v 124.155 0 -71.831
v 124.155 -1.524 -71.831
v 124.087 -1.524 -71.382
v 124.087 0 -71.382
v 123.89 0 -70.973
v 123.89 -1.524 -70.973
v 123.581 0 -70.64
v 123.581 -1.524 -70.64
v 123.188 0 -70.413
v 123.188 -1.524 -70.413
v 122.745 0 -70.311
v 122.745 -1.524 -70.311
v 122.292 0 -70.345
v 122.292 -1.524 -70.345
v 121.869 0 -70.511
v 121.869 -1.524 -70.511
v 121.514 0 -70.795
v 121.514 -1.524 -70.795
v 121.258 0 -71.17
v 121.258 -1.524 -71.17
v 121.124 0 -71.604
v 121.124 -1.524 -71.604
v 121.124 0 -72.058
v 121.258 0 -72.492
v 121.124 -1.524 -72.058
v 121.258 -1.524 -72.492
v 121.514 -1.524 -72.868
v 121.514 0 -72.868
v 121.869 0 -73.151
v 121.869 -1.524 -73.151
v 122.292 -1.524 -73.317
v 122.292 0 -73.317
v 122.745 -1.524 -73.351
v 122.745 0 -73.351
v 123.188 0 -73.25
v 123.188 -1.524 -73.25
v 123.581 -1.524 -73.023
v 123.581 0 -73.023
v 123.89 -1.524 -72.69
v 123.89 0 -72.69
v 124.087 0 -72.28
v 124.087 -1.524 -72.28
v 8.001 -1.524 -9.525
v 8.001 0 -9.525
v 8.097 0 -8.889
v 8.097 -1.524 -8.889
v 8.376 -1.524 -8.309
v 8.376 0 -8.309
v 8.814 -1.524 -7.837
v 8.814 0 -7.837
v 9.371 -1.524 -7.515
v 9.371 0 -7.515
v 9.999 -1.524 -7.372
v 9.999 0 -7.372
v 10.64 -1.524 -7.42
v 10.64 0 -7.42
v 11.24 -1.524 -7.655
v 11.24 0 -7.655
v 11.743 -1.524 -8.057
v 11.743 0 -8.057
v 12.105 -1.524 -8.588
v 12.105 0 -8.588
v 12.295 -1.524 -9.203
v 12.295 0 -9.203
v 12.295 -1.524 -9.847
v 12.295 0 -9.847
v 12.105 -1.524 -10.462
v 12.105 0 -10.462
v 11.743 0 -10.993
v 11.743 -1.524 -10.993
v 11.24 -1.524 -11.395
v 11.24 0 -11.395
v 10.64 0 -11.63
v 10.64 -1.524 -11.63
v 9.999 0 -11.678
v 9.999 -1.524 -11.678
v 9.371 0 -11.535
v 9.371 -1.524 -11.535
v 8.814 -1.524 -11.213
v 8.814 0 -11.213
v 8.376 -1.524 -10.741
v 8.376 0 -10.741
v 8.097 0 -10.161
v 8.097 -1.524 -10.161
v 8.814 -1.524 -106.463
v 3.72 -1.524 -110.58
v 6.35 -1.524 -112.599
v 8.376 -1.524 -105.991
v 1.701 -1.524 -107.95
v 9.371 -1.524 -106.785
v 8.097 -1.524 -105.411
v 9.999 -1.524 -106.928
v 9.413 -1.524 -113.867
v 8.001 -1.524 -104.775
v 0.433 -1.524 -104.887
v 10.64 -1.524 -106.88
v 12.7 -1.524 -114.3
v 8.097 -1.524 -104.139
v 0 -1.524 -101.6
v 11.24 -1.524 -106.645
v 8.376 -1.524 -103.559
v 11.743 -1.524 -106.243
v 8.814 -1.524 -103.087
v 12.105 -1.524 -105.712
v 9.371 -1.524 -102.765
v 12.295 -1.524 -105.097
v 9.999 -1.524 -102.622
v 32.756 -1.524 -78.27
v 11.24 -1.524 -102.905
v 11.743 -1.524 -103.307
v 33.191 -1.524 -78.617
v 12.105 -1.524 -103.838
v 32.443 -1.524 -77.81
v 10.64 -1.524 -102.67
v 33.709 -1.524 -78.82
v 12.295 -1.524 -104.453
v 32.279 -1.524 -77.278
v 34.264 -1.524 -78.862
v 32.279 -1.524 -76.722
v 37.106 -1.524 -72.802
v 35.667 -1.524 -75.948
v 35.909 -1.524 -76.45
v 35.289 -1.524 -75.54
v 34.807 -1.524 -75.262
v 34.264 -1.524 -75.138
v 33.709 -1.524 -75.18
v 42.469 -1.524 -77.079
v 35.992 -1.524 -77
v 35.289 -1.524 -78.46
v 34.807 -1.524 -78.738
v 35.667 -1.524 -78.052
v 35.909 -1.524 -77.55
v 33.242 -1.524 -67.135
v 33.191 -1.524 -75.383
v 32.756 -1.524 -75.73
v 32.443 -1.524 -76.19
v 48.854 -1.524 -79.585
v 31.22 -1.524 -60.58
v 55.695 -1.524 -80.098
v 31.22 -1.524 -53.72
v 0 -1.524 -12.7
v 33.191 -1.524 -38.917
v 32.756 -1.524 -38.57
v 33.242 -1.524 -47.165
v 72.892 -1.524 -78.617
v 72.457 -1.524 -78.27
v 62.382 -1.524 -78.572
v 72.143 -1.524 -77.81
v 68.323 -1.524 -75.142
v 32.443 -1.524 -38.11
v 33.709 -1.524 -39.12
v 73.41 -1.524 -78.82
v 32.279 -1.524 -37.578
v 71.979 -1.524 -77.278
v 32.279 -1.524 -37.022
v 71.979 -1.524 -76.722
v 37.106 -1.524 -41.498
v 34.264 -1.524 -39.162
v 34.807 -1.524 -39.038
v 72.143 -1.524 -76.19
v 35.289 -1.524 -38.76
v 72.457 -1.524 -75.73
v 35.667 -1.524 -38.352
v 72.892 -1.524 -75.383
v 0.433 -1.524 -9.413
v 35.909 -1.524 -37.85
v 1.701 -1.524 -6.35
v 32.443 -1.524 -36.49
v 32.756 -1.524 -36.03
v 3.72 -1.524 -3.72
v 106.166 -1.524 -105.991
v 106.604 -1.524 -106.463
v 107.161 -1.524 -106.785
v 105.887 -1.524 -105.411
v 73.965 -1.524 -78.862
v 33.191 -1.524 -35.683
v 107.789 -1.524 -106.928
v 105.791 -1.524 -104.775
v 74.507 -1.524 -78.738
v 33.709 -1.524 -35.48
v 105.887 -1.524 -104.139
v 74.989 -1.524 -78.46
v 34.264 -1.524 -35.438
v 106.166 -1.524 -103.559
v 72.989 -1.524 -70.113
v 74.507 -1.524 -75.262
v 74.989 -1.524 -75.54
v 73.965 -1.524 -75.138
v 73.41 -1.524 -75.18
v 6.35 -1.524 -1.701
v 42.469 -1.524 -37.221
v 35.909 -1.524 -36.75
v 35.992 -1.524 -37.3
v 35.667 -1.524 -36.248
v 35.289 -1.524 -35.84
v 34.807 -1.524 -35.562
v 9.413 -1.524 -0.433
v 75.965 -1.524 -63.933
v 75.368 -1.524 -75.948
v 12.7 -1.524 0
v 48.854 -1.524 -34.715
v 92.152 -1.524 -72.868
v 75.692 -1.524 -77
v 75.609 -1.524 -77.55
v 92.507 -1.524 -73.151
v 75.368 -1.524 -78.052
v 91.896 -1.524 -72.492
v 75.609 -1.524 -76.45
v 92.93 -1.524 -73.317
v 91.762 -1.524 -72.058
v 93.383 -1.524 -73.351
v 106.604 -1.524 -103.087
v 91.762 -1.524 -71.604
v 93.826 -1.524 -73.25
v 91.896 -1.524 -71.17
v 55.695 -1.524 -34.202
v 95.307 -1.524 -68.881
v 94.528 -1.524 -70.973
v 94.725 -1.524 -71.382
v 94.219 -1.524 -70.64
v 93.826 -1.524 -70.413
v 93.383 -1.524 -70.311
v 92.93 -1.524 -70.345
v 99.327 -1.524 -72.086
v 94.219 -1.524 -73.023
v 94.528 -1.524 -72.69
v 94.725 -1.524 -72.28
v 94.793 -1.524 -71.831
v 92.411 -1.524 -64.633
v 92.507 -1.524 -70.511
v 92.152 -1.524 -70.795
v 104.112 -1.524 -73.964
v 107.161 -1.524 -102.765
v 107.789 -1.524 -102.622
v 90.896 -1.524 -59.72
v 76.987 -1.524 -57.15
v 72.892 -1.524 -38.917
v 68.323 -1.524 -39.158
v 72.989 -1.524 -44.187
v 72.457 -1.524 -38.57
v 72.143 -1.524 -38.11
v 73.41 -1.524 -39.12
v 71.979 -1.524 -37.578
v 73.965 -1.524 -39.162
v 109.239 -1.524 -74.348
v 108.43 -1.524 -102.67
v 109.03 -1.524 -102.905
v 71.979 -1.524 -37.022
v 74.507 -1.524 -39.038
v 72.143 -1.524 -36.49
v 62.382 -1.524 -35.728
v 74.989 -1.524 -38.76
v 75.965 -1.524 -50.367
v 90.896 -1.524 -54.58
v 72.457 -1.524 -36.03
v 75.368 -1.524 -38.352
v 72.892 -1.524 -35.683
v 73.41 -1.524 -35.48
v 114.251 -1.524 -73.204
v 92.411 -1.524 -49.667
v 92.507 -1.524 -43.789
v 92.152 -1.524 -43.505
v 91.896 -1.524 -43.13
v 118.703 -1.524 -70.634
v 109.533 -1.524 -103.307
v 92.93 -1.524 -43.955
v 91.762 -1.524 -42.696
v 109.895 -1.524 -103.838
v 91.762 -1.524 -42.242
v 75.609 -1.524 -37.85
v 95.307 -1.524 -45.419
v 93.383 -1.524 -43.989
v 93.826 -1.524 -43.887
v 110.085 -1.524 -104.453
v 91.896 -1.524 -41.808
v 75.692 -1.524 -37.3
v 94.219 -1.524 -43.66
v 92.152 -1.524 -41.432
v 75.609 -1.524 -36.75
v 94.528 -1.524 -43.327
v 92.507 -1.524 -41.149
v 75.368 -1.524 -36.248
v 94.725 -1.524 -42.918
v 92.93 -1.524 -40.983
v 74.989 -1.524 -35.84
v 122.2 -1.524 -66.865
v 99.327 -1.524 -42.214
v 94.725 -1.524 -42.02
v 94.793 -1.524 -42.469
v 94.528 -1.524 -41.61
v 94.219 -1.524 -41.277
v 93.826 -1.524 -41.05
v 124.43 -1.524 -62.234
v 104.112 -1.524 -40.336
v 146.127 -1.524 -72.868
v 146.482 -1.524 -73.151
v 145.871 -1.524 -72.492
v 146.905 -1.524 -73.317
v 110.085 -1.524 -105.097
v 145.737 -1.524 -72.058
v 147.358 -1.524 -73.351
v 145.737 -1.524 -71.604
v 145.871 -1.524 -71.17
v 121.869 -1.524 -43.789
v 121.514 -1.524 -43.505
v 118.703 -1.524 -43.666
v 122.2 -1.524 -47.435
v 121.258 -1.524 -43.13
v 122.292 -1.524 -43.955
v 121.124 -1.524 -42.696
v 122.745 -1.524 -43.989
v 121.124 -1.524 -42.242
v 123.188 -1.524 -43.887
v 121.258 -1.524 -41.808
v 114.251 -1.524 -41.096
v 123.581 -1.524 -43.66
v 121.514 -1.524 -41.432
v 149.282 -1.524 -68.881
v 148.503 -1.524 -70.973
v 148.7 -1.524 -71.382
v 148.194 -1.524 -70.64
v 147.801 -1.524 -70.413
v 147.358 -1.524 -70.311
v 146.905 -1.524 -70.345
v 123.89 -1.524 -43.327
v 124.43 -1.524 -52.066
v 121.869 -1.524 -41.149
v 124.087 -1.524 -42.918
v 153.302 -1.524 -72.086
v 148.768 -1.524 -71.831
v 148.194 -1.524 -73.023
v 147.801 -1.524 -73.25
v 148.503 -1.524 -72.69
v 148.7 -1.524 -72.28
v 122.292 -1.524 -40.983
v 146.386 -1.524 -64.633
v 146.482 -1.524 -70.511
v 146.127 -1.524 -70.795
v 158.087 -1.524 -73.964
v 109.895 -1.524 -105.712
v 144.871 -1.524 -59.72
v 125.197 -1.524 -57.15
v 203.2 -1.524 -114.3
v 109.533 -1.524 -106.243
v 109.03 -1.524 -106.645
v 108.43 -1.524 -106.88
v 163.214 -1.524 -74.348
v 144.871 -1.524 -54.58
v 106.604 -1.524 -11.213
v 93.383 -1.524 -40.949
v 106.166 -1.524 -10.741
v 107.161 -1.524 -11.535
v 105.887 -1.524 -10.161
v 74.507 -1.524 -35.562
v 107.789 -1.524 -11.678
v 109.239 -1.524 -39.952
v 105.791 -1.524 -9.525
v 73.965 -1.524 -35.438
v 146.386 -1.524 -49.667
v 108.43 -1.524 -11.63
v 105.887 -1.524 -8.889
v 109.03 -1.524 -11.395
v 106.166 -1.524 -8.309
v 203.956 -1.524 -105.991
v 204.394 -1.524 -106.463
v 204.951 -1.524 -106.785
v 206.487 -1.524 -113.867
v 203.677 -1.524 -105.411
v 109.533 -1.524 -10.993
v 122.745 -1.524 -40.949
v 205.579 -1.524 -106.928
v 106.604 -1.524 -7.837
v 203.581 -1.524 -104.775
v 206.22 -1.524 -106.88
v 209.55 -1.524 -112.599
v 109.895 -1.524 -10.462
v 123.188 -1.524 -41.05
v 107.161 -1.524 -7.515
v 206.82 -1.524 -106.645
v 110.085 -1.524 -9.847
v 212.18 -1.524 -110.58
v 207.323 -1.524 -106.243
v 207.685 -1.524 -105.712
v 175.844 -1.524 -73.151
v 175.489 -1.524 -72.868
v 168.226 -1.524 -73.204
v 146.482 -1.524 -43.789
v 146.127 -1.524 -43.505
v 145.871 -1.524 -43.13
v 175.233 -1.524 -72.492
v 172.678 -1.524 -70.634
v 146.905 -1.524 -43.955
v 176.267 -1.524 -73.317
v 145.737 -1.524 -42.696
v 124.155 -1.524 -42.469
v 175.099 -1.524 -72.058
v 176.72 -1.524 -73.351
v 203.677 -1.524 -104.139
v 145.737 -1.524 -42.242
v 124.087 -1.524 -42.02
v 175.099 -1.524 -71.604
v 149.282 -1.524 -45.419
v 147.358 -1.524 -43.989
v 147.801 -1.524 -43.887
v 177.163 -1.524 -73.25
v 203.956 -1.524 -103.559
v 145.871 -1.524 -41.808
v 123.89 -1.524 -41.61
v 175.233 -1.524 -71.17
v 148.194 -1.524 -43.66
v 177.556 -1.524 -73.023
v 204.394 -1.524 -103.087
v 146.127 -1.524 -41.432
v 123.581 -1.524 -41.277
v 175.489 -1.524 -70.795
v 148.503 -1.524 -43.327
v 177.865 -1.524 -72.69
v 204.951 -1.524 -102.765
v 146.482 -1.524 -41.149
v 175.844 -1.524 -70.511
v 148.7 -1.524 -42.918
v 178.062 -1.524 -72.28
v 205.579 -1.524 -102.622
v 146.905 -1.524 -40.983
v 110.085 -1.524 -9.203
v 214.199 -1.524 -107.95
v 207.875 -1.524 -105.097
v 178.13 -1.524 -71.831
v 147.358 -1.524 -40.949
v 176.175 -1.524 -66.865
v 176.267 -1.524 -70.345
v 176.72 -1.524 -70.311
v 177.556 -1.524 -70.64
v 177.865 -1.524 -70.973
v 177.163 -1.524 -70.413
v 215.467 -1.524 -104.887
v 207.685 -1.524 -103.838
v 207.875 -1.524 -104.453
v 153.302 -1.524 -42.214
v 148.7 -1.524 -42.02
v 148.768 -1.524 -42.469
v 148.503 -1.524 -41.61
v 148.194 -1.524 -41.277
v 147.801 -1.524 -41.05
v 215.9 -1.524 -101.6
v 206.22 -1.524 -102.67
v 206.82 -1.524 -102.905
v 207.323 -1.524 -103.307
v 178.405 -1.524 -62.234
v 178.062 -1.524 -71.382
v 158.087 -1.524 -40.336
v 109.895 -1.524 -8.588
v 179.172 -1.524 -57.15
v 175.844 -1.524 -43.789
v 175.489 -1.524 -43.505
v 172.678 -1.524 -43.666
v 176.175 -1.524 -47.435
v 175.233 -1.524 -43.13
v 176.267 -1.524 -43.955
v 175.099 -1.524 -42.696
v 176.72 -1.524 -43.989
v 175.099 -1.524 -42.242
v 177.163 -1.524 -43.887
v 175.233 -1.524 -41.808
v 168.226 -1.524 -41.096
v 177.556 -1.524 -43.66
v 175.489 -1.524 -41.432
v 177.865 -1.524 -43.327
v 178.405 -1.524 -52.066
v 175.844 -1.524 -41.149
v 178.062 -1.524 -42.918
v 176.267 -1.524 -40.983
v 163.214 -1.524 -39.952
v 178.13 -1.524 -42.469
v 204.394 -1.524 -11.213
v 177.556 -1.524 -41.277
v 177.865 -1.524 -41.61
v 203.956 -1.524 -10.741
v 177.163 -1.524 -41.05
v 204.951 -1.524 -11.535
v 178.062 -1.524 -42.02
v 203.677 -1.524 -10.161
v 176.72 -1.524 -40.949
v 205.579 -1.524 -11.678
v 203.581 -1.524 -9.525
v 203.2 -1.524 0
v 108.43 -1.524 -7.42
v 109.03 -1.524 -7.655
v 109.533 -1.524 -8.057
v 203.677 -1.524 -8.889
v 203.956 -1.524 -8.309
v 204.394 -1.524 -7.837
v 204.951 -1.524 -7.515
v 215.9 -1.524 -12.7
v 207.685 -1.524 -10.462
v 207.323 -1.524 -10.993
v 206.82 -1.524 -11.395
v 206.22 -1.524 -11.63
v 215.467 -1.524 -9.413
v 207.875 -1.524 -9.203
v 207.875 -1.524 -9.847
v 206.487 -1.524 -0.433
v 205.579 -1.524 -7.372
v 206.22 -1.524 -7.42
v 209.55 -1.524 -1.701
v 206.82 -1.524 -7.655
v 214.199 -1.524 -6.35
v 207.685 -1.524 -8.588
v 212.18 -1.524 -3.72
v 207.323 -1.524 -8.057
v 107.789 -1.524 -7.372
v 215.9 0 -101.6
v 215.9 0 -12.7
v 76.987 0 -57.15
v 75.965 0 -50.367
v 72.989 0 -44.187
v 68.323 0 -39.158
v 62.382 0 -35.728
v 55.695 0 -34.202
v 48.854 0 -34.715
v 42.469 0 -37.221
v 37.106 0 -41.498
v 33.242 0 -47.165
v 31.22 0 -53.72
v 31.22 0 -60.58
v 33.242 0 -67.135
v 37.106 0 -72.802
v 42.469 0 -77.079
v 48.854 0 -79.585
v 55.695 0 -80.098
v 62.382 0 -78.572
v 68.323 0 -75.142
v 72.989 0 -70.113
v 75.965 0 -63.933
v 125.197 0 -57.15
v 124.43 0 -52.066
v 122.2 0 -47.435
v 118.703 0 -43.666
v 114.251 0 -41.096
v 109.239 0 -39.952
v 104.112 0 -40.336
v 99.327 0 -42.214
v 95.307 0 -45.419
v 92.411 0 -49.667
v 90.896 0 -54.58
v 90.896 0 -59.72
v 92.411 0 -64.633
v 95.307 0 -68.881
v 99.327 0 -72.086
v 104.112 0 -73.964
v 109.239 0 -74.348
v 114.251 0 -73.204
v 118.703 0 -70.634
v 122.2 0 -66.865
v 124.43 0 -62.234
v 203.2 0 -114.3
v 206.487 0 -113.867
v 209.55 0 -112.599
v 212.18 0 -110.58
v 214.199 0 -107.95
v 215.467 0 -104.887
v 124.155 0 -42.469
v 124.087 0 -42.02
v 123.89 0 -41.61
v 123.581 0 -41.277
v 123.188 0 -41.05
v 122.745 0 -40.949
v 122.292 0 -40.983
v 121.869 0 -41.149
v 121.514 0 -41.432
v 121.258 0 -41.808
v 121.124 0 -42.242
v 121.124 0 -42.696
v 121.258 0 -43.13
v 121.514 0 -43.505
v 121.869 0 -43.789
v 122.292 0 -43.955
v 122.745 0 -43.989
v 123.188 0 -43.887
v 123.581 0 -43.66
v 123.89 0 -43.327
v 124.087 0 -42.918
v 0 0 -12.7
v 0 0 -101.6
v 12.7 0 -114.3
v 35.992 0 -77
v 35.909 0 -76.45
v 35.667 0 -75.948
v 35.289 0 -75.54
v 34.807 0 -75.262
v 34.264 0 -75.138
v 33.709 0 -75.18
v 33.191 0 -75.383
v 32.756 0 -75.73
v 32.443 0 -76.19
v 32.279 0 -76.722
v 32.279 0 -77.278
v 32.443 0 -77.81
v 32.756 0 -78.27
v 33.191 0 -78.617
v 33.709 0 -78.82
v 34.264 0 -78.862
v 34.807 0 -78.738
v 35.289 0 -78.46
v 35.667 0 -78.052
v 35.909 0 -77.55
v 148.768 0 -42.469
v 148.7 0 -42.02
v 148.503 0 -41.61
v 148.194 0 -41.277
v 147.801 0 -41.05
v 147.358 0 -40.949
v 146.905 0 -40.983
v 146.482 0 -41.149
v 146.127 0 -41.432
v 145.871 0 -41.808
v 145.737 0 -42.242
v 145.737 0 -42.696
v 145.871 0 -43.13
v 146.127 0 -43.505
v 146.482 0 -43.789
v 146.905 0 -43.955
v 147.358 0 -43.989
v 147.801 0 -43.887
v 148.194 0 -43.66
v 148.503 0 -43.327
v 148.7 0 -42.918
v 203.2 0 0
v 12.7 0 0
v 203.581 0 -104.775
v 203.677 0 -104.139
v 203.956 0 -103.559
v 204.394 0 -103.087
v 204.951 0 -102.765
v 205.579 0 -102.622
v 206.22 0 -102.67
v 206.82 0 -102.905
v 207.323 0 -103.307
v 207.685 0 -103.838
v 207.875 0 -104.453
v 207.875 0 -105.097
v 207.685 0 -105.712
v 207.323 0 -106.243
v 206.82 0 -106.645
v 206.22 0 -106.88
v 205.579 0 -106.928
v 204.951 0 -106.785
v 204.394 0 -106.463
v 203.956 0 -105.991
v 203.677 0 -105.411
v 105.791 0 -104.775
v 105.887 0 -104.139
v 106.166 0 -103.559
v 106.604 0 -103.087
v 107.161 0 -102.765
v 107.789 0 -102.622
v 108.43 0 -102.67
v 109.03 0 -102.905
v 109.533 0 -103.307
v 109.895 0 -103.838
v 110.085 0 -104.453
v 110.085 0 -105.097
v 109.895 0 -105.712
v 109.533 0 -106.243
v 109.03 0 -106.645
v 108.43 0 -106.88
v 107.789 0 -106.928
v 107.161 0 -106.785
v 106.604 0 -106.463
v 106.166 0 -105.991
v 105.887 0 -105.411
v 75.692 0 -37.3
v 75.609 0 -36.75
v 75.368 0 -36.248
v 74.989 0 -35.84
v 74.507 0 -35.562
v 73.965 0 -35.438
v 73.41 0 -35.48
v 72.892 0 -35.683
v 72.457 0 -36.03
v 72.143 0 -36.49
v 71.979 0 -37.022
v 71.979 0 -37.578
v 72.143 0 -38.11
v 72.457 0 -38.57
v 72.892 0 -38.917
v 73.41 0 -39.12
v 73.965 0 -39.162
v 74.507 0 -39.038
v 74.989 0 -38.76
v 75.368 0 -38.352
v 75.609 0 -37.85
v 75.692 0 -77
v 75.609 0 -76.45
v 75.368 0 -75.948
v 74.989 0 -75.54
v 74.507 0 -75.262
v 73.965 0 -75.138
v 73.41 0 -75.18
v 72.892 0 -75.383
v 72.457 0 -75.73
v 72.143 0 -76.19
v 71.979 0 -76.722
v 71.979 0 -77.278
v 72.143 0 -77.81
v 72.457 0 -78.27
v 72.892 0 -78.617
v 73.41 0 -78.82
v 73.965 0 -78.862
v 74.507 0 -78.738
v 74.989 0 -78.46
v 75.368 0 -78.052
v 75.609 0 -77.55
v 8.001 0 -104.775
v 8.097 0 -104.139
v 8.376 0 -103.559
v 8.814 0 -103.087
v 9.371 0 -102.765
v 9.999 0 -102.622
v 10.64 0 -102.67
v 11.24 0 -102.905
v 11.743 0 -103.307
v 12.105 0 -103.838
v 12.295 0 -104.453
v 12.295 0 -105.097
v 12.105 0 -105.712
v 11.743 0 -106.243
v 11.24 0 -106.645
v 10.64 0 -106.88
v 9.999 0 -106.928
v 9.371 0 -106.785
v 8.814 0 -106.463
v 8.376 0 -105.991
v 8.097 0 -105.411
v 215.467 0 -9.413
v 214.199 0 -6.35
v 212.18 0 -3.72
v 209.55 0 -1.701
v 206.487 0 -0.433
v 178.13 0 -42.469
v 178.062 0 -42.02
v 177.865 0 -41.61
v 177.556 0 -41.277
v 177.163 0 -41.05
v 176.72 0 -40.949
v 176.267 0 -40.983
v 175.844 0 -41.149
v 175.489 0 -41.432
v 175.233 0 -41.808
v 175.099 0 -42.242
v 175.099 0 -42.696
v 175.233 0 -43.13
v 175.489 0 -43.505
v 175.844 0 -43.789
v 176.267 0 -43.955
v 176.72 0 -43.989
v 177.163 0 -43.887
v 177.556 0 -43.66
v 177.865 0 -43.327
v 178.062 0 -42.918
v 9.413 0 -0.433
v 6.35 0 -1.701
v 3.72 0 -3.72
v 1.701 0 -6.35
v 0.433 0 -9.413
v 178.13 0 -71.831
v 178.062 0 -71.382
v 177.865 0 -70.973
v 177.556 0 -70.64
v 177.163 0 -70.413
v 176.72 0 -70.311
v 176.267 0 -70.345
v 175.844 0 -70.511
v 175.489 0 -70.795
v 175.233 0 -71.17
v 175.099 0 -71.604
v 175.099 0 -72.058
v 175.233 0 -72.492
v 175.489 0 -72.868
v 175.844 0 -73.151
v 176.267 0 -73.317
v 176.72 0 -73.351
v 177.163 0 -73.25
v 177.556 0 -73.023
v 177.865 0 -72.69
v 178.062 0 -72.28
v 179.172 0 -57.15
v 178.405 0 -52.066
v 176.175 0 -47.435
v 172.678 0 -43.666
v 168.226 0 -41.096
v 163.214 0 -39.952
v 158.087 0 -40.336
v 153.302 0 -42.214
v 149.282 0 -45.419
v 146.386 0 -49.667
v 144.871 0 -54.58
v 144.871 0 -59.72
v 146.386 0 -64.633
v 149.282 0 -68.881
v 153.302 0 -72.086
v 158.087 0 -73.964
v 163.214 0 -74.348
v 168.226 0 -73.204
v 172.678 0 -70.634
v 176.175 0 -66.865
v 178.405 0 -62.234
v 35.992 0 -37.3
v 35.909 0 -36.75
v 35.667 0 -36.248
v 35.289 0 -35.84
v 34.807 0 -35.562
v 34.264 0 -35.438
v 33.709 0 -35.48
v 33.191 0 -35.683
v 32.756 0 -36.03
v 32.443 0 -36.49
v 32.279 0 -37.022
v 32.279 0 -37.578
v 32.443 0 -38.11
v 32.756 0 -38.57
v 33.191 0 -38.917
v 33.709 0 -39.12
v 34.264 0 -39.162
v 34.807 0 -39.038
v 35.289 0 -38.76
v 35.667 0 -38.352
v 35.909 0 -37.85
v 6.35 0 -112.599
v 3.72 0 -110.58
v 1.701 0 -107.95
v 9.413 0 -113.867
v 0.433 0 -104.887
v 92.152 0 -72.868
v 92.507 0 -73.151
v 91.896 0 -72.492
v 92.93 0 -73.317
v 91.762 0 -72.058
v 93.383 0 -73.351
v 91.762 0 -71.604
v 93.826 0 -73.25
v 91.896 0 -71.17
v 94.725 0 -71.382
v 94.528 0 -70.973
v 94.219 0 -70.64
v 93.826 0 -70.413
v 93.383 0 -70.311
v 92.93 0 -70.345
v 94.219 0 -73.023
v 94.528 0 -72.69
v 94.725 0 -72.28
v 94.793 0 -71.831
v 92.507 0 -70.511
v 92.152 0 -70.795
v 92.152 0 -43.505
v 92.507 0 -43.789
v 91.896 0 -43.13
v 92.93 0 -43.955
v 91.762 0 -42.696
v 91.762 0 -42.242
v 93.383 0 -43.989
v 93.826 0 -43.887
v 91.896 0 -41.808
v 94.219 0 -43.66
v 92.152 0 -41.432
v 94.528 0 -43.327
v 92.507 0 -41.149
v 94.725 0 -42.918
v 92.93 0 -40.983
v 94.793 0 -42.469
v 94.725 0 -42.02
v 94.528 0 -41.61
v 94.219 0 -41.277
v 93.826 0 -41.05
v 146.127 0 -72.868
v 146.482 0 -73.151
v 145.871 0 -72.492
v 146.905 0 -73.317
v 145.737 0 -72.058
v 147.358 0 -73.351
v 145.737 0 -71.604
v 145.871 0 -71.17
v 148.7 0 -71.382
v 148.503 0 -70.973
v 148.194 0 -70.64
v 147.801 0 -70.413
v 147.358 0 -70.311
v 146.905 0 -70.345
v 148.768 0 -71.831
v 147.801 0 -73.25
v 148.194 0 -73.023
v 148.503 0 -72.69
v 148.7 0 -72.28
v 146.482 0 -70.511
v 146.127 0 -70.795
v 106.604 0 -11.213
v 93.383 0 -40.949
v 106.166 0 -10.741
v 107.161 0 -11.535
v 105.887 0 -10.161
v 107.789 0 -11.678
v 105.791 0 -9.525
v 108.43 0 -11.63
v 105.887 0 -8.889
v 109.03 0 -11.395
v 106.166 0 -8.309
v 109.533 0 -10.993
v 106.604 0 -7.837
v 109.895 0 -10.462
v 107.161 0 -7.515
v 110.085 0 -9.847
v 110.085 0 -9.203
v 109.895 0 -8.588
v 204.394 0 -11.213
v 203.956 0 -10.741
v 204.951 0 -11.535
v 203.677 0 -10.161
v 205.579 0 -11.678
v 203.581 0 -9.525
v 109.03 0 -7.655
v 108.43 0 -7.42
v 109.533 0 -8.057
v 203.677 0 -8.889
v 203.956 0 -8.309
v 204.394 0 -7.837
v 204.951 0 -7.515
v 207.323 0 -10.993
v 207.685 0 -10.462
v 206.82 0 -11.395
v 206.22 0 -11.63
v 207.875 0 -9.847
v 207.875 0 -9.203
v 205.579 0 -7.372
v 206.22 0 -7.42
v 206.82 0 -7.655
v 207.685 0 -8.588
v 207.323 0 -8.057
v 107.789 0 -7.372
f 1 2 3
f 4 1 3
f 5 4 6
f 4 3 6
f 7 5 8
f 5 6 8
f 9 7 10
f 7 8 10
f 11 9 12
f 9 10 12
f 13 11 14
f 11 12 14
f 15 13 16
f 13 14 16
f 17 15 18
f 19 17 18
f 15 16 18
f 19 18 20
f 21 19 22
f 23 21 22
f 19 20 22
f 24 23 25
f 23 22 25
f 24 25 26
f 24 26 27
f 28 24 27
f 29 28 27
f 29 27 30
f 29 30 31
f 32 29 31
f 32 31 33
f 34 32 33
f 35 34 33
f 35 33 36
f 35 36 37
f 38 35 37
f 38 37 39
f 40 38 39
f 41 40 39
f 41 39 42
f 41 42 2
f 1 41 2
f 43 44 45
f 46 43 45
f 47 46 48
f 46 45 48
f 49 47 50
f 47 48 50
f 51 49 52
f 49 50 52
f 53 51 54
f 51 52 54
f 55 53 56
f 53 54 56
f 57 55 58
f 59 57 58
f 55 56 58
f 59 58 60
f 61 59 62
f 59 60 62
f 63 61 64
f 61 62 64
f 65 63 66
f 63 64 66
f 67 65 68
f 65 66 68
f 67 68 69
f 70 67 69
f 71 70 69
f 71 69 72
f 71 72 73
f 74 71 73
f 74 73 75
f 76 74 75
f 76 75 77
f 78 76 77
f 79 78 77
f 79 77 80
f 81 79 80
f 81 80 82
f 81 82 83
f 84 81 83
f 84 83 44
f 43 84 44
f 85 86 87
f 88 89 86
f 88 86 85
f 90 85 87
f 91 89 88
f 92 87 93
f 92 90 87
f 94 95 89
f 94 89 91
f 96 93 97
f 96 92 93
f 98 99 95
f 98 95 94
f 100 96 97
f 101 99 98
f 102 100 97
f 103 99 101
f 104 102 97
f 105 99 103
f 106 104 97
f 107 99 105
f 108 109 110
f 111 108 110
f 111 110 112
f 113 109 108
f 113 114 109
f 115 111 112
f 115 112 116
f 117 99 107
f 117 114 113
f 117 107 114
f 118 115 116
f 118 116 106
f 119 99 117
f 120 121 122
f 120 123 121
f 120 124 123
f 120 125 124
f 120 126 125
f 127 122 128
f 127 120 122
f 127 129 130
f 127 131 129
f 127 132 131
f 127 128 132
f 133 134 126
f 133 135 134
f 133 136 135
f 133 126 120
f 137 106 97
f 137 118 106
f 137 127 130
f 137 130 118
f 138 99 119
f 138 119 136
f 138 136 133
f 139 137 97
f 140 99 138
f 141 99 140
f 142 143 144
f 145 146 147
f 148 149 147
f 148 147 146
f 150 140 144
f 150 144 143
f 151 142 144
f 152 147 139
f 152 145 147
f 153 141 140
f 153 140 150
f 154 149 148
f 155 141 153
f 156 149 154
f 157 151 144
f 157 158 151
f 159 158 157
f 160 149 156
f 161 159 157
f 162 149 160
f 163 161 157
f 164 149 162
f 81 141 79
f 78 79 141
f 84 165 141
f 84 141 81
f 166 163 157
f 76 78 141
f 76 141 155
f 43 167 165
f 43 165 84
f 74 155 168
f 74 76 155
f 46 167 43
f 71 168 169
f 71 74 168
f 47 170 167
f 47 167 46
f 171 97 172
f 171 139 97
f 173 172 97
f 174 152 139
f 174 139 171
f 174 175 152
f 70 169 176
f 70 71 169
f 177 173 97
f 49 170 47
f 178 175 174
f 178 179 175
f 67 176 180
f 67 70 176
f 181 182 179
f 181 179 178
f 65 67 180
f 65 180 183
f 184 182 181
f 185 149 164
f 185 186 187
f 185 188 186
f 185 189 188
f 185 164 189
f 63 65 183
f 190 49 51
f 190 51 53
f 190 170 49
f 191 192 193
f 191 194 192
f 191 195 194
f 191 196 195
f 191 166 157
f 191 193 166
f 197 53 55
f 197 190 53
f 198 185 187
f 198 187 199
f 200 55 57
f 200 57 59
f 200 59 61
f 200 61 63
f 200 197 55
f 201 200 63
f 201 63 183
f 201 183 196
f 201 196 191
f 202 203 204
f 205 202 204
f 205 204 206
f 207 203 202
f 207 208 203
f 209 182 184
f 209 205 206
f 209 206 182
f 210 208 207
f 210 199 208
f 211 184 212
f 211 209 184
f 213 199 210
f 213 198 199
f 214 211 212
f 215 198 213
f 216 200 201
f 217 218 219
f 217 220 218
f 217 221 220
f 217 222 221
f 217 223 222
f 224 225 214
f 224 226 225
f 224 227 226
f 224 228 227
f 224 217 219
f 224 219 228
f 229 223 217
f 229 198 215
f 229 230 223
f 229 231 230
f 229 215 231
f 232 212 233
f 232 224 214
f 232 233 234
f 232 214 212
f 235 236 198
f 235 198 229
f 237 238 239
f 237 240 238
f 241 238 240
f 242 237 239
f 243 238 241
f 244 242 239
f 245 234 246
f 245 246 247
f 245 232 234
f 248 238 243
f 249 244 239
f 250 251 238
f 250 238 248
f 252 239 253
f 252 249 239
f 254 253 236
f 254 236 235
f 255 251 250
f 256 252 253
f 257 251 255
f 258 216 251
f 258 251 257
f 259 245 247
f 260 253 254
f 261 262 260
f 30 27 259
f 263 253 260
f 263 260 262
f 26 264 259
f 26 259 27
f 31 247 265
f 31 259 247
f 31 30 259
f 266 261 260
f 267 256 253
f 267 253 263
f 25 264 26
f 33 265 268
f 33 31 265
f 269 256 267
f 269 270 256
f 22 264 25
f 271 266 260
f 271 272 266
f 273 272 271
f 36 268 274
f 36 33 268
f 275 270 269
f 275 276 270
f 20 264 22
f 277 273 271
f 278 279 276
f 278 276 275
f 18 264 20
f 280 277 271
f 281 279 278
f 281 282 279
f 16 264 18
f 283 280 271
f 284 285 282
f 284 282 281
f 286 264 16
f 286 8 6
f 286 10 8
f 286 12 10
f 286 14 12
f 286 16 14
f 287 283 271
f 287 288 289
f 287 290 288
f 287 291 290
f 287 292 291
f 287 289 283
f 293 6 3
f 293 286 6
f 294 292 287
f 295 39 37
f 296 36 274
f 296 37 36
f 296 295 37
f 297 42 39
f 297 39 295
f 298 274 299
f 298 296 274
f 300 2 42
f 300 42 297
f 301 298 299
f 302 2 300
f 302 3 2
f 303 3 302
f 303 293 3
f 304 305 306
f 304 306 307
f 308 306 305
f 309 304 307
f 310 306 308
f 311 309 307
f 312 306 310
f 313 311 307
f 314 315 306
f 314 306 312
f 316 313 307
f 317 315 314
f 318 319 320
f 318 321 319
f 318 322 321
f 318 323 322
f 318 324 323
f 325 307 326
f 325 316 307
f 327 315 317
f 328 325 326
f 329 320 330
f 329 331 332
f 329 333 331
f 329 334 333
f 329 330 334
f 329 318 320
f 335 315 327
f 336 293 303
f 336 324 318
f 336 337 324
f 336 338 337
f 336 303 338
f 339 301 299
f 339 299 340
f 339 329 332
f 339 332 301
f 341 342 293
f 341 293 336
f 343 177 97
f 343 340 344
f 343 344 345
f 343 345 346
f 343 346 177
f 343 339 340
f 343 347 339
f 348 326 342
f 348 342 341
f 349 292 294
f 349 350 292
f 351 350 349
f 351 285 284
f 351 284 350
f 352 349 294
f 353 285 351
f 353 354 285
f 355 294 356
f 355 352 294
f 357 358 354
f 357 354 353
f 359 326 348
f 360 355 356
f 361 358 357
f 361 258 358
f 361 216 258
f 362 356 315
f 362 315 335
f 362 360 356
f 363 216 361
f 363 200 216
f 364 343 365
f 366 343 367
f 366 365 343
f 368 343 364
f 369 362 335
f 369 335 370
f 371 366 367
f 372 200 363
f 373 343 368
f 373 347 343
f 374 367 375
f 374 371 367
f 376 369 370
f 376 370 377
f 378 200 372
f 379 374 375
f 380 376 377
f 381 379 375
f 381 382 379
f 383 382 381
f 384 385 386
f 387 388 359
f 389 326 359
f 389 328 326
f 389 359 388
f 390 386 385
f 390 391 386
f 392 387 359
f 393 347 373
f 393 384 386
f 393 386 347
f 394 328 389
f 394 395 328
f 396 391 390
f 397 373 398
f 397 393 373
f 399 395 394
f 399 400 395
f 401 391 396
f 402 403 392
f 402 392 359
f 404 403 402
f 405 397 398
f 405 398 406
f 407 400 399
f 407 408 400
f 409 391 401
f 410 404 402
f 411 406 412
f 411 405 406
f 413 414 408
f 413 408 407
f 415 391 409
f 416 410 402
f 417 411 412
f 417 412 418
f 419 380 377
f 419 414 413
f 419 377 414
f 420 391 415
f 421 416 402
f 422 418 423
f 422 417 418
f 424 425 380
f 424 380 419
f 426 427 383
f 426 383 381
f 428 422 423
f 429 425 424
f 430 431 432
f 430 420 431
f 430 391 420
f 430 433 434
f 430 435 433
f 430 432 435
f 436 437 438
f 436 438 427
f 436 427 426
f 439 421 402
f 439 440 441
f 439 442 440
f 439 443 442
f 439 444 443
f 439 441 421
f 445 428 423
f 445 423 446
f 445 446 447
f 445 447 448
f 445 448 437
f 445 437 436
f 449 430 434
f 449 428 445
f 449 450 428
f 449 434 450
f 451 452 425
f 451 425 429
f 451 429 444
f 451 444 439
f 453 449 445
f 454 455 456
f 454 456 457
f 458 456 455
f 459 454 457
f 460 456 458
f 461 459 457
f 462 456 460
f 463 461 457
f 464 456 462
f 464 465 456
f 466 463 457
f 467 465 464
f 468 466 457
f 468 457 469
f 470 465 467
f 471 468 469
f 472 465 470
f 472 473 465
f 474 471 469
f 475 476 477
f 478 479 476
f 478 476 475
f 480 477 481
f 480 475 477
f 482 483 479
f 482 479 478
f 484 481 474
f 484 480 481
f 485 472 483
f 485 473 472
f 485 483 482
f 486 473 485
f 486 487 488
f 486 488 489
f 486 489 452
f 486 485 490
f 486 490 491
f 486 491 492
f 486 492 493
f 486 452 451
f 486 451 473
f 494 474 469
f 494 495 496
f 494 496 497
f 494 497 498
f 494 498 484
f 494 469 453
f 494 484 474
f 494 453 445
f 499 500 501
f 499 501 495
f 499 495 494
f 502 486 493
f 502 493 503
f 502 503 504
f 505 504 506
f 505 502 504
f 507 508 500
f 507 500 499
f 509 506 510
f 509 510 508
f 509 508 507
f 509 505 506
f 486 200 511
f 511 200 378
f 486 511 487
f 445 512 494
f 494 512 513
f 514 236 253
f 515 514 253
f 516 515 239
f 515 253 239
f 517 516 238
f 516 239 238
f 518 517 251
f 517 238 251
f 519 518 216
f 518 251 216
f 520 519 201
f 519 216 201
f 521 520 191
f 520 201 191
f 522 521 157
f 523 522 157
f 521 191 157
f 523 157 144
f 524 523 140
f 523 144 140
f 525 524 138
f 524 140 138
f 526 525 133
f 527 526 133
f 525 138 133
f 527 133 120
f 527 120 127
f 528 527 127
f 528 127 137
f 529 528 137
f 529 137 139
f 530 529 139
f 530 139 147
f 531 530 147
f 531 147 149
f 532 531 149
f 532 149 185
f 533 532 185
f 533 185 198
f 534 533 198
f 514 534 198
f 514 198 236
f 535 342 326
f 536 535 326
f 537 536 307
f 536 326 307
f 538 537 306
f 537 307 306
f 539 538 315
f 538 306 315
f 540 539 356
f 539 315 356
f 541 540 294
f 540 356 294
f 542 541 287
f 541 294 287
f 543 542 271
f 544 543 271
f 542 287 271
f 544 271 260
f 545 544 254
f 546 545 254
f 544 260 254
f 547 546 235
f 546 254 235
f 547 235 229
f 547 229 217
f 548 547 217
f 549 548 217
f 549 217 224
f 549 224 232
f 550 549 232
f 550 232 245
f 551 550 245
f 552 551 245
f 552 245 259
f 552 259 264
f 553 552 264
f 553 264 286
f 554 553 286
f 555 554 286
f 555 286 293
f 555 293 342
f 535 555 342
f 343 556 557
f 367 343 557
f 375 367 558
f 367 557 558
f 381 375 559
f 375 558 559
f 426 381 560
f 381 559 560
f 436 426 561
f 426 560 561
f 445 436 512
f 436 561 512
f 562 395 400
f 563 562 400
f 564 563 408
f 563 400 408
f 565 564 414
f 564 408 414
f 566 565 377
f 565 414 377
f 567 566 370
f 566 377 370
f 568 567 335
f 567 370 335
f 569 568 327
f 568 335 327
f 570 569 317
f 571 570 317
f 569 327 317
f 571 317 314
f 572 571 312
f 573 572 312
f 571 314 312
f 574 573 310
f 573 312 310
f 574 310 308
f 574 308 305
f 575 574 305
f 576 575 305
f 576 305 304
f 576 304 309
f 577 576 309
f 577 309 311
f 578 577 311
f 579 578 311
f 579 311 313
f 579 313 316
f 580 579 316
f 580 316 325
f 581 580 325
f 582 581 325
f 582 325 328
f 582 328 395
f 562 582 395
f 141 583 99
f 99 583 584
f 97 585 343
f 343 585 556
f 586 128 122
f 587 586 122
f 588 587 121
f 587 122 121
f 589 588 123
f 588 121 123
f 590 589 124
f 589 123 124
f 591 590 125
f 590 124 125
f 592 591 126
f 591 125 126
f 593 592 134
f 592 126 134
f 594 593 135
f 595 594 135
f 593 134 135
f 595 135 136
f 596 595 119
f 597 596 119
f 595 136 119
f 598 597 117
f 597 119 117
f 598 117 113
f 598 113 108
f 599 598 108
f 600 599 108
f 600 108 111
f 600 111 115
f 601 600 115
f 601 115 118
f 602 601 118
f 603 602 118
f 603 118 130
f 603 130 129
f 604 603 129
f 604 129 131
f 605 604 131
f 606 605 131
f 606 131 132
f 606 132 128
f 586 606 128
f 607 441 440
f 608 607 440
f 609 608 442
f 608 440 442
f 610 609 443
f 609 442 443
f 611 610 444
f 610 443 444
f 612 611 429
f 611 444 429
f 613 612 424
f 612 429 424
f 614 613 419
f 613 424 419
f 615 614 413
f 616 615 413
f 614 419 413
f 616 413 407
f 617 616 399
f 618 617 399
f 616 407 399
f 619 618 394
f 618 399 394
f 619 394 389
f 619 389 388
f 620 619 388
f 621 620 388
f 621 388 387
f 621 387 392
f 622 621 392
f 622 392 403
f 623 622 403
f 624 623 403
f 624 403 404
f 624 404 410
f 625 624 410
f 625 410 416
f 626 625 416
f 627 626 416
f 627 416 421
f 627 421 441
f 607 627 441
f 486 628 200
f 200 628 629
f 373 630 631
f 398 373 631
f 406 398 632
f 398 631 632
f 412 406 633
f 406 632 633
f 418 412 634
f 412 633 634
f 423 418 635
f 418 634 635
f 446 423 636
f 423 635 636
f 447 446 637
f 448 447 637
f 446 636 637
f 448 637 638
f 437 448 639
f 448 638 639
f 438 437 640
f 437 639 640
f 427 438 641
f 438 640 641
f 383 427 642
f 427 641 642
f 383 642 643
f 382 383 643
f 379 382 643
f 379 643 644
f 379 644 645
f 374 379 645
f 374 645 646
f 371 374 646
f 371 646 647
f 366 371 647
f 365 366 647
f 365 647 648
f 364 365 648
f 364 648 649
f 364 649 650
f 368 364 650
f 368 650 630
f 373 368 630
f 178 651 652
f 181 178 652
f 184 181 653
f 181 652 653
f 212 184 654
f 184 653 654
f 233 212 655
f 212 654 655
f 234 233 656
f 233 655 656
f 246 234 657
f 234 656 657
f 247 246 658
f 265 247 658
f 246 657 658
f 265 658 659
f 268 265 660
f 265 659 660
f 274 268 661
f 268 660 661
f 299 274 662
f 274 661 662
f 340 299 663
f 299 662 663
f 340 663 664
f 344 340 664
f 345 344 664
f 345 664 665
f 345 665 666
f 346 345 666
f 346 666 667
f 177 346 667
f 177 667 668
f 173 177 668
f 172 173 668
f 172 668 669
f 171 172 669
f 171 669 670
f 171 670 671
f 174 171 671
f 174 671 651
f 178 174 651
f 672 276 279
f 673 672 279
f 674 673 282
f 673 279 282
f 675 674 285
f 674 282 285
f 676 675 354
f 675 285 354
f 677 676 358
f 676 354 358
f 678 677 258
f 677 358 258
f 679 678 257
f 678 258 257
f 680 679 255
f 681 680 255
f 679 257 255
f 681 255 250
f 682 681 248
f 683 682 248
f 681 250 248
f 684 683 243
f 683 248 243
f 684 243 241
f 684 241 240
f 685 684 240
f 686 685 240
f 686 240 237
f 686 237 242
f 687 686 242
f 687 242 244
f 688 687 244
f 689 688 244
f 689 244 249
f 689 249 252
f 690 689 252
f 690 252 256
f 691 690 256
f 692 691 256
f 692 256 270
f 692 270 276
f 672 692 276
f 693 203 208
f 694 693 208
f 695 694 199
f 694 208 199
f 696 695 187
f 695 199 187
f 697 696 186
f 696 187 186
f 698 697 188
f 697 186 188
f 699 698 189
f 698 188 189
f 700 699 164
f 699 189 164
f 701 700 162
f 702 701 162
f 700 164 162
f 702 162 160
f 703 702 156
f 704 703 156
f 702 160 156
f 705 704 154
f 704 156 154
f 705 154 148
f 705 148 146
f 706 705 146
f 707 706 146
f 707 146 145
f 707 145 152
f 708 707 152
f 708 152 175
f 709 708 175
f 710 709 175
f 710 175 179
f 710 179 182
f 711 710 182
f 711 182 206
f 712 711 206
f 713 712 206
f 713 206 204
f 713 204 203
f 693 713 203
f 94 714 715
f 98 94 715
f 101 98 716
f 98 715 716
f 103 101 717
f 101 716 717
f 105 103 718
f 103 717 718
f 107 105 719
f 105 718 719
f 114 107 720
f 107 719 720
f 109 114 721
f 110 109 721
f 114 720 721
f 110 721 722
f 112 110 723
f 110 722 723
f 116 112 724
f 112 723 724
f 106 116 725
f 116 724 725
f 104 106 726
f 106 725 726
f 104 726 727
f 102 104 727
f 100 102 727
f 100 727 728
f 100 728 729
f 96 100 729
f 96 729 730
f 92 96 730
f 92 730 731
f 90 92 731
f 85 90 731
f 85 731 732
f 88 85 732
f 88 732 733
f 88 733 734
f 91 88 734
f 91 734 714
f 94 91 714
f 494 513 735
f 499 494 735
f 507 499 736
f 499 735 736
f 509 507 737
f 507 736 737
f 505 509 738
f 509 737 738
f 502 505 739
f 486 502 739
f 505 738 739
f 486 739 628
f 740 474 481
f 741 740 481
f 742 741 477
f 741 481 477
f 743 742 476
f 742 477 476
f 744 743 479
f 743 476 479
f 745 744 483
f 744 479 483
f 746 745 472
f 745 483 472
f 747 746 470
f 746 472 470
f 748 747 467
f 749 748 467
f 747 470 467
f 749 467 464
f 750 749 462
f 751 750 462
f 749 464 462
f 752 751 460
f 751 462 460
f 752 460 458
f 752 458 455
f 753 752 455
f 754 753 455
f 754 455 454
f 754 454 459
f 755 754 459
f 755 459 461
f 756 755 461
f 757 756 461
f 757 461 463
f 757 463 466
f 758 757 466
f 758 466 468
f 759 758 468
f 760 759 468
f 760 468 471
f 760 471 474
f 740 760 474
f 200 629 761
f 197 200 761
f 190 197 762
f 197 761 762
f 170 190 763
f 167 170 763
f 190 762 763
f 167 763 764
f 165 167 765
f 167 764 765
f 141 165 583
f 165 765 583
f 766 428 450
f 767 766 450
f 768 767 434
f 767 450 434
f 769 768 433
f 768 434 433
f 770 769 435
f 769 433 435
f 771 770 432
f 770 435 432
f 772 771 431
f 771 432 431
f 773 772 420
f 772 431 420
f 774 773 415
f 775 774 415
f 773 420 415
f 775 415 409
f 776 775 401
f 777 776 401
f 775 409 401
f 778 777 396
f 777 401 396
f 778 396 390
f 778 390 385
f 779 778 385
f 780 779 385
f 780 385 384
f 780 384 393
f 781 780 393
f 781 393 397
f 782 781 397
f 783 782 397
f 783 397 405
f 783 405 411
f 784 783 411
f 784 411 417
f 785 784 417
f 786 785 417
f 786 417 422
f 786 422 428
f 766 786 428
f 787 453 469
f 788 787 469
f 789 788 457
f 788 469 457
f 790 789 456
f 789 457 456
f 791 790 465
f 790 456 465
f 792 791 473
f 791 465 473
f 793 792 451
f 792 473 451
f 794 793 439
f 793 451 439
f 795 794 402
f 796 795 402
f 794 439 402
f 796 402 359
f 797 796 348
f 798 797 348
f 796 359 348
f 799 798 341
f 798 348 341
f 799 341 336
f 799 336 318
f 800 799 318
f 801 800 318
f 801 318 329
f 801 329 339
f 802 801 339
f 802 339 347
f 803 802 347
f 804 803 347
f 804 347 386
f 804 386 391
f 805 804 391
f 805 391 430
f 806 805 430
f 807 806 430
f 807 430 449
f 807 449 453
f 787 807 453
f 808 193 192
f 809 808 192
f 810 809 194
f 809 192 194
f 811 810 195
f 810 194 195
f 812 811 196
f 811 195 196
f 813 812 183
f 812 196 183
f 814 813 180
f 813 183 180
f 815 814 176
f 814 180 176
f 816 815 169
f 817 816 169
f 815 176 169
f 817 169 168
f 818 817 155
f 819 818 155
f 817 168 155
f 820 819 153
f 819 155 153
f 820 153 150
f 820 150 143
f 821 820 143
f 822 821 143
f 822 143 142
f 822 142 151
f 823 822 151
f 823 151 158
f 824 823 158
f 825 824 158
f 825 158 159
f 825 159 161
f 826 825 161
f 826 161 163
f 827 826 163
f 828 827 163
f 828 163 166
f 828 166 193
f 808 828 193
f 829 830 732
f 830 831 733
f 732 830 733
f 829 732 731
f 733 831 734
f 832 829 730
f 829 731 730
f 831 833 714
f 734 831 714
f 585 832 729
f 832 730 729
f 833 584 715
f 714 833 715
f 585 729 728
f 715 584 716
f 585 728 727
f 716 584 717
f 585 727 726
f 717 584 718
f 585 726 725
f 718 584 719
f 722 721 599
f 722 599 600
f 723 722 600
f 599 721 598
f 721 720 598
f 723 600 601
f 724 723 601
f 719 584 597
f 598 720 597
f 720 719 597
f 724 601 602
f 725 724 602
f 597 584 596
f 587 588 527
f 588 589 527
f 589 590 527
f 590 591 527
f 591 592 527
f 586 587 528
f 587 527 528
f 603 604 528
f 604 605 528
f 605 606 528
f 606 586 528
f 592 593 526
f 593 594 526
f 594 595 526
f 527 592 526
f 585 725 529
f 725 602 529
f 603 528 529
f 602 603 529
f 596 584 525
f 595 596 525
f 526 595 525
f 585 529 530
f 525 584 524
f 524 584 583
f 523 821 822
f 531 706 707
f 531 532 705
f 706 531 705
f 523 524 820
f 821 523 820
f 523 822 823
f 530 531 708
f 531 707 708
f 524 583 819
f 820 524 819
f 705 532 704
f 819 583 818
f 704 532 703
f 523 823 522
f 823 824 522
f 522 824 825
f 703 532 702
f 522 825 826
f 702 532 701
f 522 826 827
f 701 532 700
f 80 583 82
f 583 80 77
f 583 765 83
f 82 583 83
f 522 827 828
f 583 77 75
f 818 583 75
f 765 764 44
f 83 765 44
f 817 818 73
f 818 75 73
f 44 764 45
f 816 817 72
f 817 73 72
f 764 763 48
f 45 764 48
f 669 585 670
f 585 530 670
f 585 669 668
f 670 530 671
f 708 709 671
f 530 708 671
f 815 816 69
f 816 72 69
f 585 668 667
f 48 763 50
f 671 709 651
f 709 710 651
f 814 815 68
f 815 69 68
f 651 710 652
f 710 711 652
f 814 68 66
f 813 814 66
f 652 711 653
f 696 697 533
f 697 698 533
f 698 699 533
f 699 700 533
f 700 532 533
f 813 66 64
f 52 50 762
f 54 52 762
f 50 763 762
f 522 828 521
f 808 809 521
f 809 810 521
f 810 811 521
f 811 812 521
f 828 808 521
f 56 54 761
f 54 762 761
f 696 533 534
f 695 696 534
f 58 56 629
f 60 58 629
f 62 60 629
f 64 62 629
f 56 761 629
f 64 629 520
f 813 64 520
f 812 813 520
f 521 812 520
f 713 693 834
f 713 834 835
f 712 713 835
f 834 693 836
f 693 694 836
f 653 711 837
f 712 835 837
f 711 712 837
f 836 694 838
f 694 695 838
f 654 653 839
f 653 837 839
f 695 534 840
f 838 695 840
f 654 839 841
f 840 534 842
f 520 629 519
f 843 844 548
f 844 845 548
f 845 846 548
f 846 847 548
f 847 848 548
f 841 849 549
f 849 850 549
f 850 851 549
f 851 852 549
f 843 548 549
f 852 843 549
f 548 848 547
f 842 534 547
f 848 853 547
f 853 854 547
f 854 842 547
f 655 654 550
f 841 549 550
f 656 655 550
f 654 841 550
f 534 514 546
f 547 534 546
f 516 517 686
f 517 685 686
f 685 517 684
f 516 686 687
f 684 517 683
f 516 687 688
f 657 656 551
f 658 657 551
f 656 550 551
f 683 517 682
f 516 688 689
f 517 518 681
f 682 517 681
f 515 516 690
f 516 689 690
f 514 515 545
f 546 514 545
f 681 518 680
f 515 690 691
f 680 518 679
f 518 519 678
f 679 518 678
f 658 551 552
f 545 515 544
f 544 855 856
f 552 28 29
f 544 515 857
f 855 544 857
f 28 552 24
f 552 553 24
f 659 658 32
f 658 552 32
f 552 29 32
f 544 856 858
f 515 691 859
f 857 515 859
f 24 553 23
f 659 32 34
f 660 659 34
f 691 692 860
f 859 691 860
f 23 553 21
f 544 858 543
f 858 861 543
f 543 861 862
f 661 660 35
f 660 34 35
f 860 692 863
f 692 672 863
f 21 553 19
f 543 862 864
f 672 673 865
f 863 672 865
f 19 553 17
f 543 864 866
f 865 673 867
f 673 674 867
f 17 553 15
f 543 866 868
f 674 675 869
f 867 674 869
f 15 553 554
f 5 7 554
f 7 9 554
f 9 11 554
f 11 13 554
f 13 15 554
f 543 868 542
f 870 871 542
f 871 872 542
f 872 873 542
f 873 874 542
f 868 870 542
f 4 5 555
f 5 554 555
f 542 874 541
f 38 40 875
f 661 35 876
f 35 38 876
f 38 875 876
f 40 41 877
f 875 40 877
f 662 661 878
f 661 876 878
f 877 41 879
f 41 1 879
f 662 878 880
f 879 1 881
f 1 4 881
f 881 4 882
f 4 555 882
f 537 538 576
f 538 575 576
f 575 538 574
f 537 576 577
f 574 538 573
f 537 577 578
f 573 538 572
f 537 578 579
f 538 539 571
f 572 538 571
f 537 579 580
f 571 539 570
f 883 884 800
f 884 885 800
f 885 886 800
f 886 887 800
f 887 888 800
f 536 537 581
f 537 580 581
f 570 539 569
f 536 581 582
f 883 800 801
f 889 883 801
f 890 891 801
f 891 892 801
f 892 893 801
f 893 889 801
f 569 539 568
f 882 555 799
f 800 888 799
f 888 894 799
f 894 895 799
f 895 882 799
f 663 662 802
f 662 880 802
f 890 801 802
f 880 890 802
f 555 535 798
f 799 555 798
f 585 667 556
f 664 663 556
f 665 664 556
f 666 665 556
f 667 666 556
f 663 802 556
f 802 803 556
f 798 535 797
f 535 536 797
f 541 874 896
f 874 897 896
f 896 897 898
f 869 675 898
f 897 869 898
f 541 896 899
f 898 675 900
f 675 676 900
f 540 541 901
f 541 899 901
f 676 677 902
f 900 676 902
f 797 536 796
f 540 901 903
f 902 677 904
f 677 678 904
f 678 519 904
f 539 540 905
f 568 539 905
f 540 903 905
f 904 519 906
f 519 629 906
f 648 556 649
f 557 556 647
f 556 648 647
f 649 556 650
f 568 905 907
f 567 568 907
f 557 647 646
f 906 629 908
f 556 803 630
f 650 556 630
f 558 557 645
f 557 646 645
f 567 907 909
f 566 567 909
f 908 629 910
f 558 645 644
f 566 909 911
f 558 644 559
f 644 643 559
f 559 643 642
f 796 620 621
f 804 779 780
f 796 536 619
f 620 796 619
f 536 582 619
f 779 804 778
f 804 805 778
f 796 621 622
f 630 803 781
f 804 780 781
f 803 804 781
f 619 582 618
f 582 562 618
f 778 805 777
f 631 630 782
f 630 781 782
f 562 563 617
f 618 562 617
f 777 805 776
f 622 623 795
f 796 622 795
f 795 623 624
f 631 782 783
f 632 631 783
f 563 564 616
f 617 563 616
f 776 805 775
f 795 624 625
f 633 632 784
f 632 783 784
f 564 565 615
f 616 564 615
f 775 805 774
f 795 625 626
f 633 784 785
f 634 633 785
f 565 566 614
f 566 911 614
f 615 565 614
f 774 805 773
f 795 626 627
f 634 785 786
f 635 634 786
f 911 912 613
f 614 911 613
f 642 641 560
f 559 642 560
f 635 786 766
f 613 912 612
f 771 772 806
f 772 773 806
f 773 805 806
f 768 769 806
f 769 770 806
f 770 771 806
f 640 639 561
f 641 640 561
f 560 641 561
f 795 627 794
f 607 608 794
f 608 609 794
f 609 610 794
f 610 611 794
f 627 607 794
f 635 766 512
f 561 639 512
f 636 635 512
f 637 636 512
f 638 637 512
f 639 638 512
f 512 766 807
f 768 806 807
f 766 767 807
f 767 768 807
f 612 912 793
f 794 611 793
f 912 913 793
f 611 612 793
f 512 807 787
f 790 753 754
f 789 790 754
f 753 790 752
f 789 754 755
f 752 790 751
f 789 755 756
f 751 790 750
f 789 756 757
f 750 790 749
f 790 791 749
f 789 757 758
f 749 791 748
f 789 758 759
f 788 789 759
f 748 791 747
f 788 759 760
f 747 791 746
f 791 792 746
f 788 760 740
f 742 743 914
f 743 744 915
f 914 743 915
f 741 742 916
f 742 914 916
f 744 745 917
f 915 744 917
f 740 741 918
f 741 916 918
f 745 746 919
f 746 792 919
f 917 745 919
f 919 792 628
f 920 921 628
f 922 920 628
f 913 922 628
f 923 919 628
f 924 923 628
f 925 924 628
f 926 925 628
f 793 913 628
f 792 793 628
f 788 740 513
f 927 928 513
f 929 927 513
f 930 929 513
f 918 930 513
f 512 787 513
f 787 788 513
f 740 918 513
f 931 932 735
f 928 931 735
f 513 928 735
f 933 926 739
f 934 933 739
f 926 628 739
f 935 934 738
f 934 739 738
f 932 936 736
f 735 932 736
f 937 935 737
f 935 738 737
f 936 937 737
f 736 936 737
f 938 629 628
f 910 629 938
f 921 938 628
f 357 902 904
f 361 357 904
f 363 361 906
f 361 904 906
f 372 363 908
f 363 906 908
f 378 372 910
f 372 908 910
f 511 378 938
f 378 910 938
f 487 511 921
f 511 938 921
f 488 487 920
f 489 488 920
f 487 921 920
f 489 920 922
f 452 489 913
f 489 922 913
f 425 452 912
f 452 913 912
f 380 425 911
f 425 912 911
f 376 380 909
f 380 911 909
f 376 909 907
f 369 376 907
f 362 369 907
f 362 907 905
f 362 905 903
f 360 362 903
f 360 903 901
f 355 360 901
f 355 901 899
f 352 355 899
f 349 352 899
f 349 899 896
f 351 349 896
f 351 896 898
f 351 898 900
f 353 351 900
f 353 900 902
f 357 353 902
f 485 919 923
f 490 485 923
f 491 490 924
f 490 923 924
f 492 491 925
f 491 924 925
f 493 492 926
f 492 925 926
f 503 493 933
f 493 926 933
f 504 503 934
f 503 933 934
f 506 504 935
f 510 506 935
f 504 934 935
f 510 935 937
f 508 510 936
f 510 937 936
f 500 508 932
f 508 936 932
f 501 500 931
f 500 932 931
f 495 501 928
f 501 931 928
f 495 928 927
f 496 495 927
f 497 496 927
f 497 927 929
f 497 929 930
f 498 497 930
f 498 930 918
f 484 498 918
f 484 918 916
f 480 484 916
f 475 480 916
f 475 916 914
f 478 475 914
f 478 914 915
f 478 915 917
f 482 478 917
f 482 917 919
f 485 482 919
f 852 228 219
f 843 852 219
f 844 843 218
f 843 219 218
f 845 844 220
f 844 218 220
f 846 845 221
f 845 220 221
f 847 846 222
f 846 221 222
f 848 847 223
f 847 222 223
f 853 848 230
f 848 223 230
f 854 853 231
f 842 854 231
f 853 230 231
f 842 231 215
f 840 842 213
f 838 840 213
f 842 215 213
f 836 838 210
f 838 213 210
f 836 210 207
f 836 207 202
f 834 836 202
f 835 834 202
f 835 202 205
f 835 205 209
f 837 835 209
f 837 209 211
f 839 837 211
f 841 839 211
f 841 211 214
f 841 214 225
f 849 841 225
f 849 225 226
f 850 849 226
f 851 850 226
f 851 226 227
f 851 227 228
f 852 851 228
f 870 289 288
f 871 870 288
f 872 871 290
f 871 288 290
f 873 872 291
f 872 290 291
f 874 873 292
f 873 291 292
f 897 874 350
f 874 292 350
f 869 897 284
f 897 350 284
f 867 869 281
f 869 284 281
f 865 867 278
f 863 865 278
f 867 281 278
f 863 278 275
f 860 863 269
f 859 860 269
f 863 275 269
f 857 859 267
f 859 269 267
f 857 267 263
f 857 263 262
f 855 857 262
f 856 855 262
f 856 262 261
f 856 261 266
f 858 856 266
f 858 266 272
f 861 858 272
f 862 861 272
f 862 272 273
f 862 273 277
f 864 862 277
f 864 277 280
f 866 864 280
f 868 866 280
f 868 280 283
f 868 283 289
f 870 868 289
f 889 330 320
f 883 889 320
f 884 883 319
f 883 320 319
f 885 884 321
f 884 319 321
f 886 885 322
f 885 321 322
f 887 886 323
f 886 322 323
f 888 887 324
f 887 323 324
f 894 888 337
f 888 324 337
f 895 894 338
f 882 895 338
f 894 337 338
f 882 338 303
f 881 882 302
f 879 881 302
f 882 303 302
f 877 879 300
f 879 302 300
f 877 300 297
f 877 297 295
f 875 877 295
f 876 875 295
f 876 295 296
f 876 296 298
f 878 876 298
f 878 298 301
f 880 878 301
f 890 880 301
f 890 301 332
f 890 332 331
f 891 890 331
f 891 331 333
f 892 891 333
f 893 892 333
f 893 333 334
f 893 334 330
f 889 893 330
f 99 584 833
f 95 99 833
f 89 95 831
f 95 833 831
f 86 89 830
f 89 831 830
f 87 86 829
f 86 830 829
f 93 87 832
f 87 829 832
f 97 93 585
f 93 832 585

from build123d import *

# Parameters (mm, degrees)
F1_DEPTH = 1.524
F2_R     = 23.0124
F2_R_2   = 1.8669
F2_R_3   = 17.2466
F2_R_4   = 1.524
F3_DEPTH = 1.525
F5_D     = 4.318


with BuildPart() as f1:
    # F0 (on Front) → F1 (new body)
    with BuildSketch(Plane.XZ):
        with BuildLine():
            Line((203.2, 0), (12.7, 0))
            ThreePointArc((12.7, 0), (3.7197438789, -3.7197438789), (0, -12.7))
            Line((0, -12.7), (0, -101.6))
            ThreePointArc((0, -101.6), (3.7197438789, -110.5802561211), (12.7, -114.3))
            Line((12.7, -114.3), (203.2, -114.3))
            ThreePointArc((203.2, -114.3), (212.1802561211, -110.5802561211), (215.9, -101.6))
            Line((215.9, -101.6), (215.9, -12.7))
            ThreePointArc((215.9, -12.7), (212.1802561211, -3.7197438789), (203.2, 0))
        make_face()
    extrude(amount=F1_DEPTH)

    # F2 (on face) → F3 (cut, through all)
    with BuildSketch(Plane.XZ.offset(1.524)):
        with Locations((53.975, -57.15)):
            Circle(F2_R)
        with Locations((34.1249, -37.2999)):
            Circle(F2_R_2)
        with Locations((73.8251, -37.2999)):
            Circle(F2_R_2)
        with Locations((73.8251, -77.0001)):
            Circle(F2_R_2)
        with Locations((34.1249, -77.0001)):
            Circle(F2_R_2)
        with Locations((161.925, -57.15)):
            Circle(F2_R_3)
        with Locations((147.2438, -42.4688)):
            Circle(F2_R_4)
        with Locations((176.6062, -42.4688)):
            Circle(F2_R_4)
        with Locations((176.6062, -71.8312)):
            Circle(F2_R_4)
        with Locations((147.2438, -71.8312)):
            Circle(F2_R_4)
        with Locations((107.95, -57.15)):
            Circle(F2_R_3)
        with Locations((93.2688, -42.4688)):
            Circle(F2_R_4)
        with Locations((122.6312, -42.4688)):
            Circle(F2_R_4)
        with Locations((122.6312, -71.8312)):
            Circle(F2_R_4)
        with Locations((93.2688, -71.8312)):
            Circle(F2_R_4)
    extrude(amount=-F3_DEPTH, mode=Mode.SUBTRACT)

    # F5 (through all)
    with Locations(Plane.XZ.offset(1.524)):
        with Locations((10.16, -9.525), (107.95, -9.525), (205.74, -9.525), (205.74, -104.775), (107.95, -104.775), (10.16, -104.775)):
            Hole(F5_D / 2)


solid = f1.part
